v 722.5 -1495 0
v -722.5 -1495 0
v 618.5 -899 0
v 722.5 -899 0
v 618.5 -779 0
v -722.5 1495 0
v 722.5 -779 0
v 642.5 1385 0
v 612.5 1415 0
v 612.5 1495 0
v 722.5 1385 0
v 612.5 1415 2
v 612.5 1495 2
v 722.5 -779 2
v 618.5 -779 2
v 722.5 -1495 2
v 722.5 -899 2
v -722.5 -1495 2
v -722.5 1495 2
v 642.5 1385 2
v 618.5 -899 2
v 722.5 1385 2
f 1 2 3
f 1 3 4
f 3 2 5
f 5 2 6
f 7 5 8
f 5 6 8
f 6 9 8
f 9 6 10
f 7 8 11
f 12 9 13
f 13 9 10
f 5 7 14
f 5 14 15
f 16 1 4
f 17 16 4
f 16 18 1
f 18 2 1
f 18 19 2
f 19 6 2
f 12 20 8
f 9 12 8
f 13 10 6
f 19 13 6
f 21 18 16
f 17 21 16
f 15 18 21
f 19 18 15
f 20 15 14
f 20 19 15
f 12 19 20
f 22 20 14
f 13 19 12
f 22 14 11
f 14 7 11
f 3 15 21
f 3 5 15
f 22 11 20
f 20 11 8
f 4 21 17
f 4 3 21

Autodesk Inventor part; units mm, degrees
ref_plane "YZ Plane" through (0, 0, 0) normal (1, 0, 0) x (0, 1, 0)
ref_plane "XZ Plane" through (0, 0, 0) normal (0, 1, 0) x (-1, 0, 0)
ref_plane "XY Plane" through (0, 0, 0) normal (0, 0, 1) x (1, 0, 0)
sketch "Sketch1" plane through (0, 0, 0) normal (0, 0, 1) x (1, 0, 0)
  line L0 (-722.5, -1495) -> (722.5, -1495)
  line L1 (722.5, -1495) -> (722.5, 1495)
  line L2 (722.5, 1495) -> (-722.5, 1495)
  line L3 (-722.5, 1495) -> (-722.5, -1495)
  line L4 (-722.5, -1495) -> (722.5, 1495) construction
  line L5 (722.5, -1495) -> (-722.5, 1495) construction
  line L6 (722.5, -779) -> (618.5, -779)
  line L7 (618.5, -779) -> (618.5, -899)
  line L8 (618.5, -899) -> (722.5, -899)
  line L9 (722.5, -899) -> (722.5, -779)
  line L10 (722.5, 1385) -> (612.5, 1385)
  line L11 (612.5, 1385) -> (612.5, 1495)
  point P0 (0, 0)
  point P1 (722.5, -899)
  dimension "d154" = 1445
  dimension "d155" = 2990
  dimension "d159" = 120
  dimension "d161" = 104
  dimension "d162" = 596
  dimension "d163" = 110
extrude "Plate5" add sketch "Sketch1" along normal blind 2 contours L3 L2 L11 L10 L1 L6 L7 L8 L0
chamfer "Corner Chamfer2" distance 30 angle 45 1 edges at (612.5, 1385, 1)
properties part number "PNS-0114 floor sheet 4" material "Stainless Steel"
